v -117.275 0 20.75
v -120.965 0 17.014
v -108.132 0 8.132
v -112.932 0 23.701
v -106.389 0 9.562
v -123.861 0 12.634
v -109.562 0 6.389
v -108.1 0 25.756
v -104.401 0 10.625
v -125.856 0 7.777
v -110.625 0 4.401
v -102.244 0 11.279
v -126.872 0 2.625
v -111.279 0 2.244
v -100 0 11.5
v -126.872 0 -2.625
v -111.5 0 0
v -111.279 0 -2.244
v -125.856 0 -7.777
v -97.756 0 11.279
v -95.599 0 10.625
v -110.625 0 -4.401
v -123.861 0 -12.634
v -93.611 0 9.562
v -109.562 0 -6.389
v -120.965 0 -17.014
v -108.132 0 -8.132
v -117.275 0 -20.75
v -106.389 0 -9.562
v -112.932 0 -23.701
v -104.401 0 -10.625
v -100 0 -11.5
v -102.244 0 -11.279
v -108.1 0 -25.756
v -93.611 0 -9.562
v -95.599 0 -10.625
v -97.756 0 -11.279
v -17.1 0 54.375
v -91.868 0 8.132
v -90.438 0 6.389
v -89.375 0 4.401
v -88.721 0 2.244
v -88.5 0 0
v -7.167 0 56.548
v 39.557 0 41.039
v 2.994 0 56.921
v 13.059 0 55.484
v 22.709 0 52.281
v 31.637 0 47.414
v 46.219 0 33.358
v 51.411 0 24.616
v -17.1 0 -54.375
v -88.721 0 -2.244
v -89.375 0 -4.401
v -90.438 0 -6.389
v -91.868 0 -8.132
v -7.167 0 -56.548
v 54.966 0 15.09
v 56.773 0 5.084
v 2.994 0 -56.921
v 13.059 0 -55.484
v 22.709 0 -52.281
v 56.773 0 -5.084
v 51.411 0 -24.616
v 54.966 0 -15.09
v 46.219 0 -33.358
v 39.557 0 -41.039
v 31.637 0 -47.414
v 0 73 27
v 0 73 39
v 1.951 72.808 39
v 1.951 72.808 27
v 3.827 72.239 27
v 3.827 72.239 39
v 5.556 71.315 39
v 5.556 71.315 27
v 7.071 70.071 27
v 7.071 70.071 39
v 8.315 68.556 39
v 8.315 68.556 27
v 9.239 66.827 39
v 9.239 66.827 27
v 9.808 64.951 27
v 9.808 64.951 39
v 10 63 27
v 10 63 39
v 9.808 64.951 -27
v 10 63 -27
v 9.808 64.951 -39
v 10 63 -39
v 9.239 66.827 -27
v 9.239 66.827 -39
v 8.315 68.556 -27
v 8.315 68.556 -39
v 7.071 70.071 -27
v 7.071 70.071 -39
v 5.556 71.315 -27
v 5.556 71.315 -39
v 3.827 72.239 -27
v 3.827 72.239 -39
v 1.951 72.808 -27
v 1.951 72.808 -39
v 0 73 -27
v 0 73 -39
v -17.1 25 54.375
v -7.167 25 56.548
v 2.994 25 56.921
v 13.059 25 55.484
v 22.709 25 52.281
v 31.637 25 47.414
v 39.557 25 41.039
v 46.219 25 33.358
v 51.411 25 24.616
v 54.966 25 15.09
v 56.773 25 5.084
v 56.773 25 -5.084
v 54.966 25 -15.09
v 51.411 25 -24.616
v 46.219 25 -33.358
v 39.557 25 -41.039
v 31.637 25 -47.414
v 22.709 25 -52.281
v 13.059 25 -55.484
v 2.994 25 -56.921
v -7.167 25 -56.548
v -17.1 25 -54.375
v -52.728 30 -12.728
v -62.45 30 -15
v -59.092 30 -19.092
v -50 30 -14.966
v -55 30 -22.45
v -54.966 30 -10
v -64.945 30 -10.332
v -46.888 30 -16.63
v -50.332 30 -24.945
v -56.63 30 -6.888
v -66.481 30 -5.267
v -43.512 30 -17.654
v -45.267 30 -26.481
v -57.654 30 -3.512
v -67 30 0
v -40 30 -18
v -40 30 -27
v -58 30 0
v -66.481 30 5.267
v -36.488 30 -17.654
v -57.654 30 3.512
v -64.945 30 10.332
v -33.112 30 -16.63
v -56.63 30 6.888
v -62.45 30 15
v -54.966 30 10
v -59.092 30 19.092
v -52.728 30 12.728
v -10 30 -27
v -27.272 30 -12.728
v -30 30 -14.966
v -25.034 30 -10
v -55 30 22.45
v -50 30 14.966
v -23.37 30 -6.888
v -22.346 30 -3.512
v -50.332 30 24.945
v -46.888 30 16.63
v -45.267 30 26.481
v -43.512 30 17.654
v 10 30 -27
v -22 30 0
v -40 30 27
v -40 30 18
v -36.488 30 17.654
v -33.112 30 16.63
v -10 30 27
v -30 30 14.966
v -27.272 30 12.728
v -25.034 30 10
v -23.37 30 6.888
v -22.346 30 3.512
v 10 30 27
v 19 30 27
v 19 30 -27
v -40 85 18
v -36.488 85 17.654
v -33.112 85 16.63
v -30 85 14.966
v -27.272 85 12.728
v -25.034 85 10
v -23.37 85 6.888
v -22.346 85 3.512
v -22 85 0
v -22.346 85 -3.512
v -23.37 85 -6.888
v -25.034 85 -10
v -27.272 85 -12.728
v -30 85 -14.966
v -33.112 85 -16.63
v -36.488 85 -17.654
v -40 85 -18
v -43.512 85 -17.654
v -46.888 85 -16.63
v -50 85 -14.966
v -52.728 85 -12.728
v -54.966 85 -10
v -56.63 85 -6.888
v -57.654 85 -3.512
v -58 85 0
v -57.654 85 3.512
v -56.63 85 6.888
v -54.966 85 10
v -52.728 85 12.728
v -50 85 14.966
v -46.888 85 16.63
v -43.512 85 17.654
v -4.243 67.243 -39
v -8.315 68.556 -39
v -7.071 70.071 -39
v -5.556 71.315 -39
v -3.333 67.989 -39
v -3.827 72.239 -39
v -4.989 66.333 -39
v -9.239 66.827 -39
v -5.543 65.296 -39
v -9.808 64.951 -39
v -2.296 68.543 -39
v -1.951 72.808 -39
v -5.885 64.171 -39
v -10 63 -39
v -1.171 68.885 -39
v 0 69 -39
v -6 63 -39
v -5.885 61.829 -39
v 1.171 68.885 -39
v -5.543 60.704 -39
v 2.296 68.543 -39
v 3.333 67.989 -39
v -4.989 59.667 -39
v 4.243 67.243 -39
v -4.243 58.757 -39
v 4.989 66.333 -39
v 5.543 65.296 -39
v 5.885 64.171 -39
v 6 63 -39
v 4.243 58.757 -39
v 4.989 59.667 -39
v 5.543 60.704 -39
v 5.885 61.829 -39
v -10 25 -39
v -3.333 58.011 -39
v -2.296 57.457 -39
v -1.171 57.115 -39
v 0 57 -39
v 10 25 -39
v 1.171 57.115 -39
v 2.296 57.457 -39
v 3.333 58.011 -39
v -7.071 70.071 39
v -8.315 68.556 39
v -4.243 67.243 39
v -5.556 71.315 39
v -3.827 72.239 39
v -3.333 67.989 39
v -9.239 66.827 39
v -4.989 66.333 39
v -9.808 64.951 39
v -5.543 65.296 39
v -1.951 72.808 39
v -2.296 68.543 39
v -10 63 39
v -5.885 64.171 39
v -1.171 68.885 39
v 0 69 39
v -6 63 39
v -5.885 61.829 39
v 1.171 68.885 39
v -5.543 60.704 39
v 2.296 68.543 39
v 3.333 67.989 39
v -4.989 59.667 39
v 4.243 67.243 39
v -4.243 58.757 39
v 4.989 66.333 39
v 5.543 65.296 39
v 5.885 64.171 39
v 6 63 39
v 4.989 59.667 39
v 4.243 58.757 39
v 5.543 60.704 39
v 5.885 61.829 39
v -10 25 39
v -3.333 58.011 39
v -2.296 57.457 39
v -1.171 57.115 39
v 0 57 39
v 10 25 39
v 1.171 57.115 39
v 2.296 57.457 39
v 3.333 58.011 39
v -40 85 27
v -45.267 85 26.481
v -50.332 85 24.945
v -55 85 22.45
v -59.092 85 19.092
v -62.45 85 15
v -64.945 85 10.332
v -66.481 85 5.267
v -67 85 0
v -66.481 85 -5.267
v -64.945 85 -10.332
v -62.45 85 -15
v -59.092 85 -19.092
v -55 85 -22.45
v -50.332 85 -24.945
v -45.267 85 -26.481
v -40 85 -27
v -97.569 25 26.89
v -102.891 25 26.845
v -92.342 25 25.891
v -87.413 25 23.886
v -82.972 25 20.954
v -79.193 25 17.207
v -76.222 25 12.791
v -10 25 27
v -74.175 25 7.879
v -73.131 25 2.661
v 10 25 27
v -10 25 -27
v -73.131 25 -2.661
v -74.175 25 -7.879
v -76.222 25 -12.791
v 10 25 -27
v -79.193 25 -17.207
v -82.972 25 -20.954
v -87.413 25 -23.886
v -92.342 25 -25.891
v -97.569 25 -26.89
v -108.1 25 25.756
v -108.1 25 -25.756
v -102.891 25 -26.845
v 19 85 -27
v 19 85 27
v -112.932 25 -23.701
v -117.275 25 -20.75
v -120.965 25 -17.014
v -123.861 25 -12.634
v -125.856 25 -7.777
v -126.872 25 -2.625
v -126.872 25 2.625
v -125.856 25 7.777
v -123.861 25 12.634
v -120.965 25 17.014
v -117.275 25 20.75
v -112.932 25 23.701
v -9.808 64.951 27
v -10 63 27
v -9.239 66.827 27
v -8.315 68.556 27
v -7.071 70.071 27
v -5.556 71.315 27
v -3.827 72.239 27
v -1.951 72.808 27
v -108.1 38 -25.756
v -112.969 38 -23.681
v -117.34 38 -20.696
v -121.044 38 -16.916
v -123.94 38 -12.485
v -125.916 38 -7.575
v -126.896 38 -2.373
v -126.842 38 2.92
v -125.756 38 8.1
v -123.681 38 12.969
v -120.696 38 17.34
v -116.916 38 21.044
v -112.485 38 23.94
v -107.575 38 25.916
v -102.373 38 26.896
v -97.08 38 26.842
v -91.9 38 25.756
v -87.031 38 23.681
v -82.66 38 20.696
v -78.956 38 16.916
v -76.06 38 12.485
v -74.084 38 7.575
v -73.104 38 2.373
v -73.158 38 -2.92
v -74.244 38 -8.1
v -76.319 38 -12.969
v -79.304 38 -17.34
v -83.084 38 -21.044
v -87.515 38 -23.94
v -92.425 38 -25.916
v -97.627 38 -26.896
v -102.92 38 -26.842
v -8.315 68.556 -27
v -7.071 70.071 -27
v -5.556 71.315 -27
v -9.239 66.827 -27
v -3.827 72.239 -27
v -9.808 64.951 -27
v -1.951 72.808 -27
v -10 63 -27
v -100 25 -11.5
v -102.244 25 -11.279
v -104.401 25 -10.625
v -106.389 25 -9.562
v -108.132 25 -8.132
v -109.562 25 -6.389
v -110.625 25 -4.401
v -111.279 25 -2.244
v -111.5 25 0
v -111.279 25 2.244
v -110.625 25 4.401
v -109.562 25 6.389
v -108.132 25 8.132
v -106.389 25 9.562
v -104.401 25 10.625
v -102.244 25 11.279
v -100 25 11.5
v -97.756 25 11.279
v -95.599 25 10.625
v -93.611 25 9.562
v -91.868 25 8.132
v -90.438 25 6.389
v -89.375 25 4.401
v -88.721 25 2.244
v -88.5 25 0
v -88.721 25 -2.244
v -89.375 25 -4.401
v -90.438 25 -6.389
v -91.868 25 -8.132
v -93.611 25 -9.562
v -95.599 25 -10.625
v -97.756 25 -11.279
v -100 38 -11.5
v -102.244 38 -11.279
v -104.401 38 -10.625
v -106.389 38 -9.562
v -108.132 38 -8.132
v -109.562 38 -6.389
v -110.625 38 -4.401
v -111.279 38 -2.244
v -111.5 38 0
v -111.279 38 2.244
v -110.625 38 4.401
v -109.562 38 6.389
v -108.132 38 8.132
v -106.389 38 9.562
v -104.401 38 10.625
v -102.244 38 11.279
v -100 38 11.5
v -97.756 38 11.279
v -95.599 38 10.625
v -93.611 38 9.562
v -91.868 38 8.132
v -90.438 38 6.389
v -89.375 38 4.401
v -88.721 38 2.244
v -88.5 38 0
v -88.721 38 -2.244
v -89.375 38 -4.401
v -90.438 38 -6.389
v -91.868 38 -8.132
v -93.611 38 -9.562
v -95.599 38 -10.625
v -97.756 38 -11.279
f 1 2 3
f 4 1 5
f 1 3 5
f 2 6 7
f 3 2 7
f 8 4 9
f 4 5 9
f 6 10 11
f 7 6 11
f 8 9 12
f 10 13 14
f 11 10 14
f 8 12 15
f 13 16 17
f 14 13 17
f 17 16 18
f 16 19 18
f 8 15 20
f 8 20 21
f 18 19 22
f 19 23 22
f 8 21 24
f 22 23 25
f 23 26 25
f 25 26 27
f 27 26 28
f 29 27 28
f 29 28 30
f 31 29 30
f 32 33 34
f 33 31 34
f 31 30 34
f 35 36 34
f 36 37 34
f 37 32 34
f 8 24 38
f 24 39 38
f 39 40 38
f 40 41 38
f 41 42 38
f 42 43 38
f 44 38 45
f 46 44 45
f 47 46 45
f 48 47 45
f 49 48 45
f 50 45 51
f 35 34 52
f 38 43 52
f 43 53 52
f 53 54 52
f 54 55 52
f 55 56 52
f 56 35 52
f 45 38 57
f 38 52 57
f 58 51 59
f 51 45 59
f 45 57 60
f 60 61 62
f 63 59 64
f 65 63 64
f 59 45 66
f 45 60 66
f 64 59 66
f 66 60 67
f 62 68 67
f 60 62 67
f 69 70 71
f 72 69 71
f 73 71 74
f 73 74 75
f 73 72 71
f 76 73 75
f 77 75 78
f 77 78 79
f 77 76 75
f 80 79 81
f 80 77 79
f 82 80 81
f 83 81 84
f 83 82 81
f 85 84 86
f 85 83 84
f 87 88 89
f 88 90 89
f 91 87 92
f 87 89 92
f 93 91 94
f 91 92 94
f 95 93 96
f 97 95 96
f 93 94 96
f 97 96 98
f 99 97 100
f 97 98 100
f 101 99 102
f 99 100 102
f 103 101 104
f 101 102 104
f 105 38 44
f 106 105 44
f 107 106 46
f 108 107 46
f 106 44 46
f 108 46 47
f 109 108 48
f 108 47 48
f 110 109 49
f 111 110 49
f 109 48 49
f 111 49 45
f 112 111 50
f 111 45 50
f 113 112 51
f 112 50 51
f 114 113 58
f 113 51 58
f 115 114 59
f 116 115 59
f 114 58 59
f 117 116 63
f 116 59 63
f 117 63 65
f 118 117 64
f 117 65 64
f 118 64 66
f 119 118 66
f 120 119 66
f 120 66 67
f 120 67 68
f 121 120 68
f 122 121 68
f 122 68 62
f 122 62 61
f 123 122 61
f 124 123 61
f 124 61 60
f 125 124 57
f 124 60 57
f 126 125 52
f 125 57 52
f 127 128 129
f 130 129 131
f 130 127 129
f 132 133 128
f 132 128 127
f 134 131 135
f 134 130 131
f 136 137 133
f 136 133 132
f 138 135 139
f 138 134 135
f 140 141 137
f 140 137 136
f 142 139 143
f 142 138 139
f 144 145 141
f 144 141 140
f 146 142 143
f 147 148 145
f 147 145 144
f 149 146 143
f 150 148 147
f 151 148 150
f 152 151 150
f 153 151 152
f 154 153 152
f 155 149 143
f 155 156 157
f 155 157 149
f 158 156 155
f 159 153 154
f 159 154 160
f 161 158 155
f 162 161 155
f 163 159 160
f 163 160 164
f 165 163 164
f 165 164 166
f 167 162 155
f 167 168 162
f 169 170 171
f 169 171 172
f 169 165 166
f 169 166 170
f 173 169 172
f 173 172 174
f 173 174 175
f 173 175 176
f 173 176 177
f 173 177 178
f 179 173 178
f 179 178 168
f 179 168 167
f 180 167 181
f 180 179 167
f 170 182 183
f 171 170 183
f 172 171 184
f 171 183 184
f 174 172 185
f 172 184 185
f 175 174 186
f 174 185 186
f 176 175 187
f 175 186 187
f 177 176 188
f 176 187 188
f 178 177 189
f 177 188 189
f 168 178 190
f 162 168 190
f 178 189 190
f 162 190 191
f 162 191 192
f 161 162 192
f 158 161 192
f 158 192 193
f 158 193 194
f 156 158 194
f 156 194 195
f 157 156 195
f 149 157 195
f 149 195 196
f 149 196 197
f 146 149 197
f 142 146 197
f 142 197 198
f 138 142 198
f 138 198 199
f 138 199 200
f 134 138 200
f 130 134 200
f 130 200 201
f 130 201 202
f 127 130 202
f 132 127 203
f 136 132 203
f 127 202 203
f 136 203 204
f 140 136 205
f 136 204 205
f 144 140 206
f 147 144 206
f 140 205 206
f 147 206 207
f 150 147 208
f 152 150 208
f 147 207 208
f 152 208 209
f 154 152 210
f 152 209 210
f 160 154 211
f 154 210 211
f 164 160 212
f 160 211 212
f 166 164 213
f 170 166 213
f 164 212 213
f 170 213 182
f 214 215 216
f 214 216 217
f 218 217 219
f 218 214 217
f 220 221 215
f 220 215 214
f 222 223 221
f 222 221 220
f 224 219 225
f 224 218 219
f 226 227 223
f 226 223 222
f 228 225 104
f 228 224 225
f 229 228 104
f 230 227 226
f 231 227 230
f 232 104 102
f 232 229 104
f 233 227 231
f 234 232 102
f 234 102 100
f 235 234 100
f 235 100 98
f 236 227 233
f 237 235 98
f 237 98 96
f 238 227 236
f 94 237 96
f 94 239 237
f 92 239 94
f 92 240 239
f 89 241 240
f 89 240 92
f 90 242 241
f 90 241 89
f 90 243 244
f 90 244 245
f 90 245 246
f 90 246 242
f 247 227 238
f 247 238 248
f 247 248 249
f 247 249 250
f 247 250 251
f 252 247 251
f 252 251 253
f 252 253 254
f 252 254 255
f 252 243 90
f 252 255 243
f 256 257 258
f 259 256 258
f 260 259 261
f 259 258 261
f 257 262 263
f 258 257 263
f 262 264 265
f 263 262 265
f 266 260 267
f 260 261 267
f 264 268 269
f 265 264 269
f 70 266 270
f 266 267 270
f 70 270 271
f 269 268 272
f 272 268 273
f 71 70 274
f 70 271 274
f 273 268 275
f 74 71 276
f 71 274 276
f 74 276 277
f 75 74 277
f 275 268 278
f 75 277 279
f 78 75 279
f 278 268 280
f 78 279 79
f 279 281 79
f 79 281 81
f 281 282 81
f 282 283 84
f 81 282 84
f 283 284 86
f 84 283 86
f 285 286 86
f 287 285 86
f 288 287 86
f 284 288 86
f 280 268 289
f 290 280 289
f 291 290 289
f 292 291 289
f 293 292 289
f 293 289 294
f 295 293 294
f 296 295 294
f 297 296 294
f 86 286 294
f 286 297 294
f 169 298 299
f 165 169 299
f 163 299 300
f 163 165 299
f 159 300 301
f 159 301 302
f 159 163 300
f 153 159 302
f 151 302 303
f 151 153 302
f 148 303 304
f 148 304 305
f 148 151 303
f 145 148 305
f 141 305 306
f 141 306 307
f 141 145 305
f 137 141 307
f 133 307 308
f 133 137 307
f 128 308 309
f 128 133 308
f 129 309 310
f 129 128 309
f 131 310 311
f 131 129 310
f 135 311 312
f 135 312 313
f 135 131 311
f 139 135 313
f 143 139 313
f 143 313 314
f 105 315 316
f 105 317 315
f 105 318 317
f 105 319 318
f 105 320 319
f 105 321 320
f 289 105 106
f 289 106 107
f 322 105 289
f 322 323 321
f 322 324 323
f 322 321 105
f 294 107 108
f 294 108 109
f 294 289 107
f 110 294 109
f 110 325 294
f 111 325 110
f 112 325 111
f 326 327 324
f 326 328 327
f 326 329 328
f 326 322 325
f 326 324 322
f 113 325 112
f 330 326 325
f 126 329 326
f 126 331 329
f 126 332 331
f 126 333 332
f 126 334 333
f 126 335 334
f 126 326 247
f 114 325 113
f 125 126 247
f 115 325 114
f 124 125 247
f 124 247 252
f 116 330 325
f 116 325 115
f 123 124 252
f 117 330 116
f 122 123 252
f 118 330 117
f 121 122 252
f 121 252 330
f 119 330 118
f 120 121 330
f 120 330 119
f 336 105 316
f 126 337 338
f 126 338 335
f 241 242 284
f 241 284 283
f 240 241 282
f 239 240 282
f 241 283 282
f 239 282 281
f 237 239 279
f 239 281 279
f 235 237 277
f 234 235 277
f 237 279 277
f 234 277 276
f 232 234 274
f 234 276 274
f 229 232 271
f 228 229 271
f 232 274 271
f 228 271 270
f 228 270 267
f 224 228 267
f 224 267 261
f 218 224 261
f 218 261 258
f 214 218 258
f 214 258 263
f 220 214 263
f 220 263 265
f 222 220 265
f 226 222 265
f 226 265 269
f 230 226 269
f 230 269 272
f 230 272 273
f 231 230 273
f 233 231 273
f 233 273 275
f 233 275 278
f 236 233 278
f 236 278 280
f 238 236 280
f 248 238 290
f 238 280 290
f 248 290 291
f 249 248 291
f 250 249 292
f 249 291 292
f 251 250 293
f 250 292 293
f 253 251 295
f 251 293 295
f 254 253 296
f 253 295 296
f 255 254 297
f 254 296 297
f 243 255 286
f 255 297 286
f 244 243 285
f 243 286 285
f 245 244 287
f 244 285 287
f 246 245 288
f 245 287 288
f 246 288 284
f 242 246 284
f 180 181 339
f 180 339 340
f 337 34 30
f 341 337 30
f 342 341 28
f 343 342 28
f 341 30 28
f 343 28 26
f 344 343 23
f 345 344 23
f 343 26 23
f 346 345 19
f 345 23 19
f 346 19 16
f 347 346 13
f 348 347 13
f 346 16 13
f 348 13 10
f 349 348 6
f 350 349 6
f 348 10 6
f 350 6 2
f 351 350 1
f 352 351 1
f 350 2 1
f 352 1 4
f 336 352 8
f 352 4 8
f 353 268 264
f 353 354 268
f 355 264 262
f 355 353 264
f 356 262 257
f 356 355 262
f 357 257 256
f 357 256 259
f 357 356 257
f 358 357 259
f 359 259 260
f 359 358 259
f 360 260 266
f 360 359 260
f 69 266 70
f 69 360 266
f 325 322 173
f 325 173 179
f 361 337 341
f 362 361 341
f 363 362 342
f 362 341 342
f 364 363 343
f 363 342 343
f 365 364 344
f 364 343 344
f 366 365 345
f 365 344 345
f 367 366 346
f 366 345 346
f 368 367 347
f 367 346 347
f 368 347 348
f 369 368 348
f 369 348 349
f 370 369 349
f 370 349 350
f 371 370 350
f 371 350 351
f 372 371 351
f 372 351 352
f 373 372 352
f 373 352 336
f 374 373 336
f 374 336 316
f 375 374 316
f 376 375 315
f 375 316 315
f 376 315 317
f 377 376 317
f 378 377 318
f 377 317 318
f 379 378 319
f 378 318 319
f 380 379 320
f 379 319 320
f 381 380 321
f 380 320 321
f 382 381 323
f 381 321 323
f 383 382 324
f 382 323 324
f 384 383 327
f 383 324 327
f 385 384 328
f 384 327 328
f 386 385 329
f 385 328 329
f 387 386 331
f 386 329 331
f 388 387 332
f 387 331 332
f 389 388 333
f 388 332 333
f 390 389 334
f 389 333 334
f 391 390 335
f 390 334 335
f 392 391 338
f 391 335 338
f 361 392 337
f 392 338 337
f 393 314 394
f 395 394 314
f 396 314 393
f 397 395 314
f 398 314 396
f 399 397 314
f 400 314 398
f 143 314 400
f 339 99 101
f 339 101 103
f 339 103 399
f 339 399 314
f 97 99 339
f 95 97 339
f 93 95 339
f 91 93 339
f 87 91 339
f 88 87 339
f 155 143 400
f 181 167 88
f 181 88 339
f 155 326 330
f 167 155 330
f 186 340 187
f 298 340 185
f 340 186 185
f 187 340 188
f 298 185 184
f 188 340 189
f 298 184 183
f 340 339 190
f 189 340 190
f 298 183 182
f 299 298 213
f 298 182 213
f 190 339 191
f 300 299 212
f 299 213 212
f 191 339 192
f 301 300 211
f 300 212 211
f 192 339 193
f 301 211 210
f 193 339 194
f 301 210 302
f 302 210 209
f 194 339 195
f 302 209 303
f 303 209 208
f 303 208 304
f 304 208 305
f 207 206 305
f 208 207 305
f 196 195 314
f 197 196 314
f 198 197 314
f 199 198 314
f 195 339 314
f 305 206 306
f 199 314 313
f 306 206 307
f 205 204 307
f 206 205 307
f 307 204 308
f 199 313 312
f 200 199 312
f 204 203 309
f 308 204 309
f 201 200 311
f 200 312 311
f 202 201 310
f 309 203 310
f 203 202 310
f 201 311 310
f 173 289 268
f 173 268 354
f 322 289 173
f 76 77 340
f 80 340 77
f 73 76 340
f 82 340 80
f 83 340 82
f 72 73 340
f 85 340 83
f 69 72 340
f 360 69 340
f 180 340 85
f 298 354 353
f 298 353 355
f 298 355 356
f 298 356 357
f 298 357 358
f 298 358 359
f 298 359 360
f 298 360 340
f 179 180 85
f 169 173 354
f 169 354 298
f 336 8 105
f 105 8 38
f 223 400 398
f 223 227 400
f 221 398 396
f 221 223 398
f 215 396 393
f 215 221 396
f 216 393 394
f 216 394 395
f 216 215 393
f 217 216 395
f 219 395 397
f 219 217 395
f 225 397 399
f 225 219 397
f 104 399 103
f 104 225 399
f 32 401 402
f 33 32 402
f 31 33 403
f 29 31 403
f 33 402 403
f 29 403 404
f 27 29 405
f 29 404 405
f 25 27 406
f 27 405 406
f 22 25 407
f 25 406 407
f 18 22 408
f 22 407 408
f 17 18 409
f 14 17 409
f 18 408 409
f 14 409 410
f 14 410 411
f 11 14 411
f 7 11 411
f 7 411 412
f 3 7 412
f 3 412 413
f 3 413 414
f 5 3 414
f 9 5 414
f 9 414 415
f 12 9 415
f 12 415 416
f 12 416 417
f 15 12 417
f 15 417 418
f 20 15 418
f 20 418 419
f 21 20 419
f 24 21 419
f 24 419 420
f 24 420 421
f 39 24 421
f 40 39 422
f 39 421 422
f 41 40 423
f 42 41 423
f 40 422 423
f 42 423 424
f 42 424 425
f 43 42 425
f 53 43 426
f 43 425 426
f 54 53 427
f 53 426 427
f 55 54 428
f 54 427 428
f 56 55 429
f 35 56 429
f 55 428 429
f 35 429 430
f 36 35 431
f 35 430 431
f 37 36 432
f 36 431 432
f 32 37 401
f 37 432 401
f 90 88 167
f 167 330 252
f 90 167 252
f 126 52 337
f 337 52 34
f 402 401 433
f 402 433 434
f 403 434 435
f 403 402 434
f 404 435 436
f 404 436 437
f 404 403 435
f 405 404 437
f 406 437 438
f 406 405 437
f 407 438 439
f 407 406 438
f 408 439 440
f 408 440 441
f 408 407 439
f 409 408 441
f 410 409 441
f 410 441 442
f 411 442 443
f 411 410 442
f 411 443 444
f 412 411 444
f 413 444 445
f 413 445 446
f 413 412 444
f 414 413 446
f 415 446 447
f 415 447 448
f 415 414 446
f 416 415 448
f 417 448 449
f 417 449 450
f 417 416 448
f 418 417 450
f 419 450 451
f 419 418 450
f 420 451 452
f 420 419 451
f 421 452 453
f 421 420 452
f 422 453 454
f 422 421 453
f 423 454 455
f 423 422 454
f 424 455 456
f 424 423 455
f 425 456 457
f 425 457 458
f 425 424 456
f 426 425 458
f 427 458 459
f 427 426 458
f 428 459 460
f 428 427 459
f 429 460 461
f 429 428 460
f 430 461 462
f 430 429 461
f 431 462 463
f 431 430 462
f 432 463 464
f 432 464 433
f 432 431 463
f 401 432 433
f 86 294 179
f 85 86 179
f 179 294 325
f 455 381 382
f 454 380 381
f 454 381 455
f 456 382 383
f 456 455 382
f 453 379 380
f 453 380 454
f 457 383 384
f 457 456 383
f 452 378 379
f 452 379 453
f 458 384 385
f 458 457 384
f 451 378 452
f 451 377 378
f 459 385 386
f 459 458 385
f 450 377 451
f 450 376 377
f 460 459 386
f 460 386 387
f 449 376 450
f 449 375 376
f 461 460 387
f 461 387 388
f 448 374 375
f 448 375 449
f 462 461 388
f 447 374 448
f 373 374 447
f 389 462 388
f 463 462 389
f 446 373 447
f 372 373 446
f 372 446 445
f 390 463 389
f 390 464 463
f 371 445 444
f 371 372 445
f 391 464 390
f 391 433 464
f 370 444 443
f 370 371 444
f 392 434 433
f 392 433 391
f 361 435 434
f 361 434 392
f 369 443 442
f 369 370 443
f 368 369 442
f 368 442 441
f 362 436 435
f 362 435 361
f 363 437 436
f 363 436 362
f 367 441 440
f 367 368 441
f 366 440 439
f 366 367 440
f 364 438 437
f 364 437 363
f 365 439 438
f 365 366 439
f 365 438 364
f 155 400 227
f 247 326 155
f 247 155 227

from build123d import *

# Parameters (mm, degrees)
BASE_DEPTH                 = 25
SKETCH2_R                  = 27
SKETCH2_R_2                = 11.5
FRONT_THRU_BORDER_DEPTH    = 13
SKETCH4_R                  = 11.5
FRONT_THRU_HOLE_DEPTH      = 142.431962441
TOP_FEATURE_DEPTH          = 60
SKETCH6_R                  = 18
TOP_FEATURE_HOLE_DEPTH     = 60
SKETCH7_W                  = 90
SKETCH7_H                  = 5
TOP_FEATURE_GAP_DEPTH      = 175.38463235
SKETCH8_W                  = 20
SKETCH8_H                  = 12
TOP_FEATURE_ARM_DEPTH      = 48
FILLET2_R                  = 10
SKETCH10_R                 = 6
TOP_FEATURE_ARM_HOLE_DEPTH = 181.471604415


with BuildPart() as part:
    # Sketch1 → base (new body)
    with BuildSketch(Plane(origin=(0, 0, 0), x_dir=(1, 0, 0), z_dir=(0, 1, 0))):
        with BuildLine():
            Line((-108.1, -25.756358438), (-17.1, -54.374534481))
            ThreePointArc((-17.1, -54.374534481), (57, 0), (-17.1, 54.374534481))
            Line((-17.1, 54.374534481), (-108.1, 25.756358438))
            ThreePointArc((-108.1, 25.756358438), (-127, 0), (-108.1, -25.756358438))
        make_face()
    extrude(amount=BASE_DEPTH)

    # Sketch2 → front thru border (add)
    with BuildSketch(Plane(origin=(0, 25, 0), x_dir=(1, 0, 0), z_dir=(0, 1, 0))):
        with Locations(Location((-100, 0, 0), (0, 0, 107.457603124))):
            Circle(SKETCH2_R)
        with Locations(Location((-100, 0, 0), (0, 0, 90))):
            Circle(SKETCH2_R_2, mode=Mode.SUBTRACT)
    extrude(amount=FRONT_THRU_BORDER_DEPTH)

    # Sketch4 → front thru hole (cut, through all)
    with BuildSketch(Plane(origin=(0, 25, 0), x_dir=(1, 0, 0), z_dir=(0, 1, 0))):
        with Locations(Location((-100, 0, 0), (0, 0, 90))):
            Circle(SKETCH4_R)
    extrude(amount=-FRONT_THRU_HOLE_DEPTH, mode=Mode.SUBTRACT)

    # Sketch5 → top feature (add)
    with BuildSketch(Plane(origin=(0, 25, 0), x_dir=(1, 0, 0), z_dir=(0, 1, 0))):
        with BuildLine():
            Line((0, -27), (-40, -27))
            ThreePointArc((-40, -27), (-67, 0), (-40, 27))
            Line((-40, 27), (0, 27))
            Line((0, 27), (19, 27))
            Line((19, 27), (19, -27))
            Line((19, -27), (0, -27))
        make_face()
    extrude(amount=TOP_FEATURE_DEPTH)

    # Sketch6 → top feature hole (cut)
    with BuildSketch(Plane(origin=(0, 85, 0), x_dir=(1, 0, 0), z_dir=(0, 1, 0))):
        with Locations(Location((-40, 0, 0), (0, 0, 270))):
            Circle(SKETCH6_R)
    extrude(amount=-TOP_FEATURE_HOLE_DEPTH, mode=Mode.SUBTRACT)

    # Sketch7 → top feature gap (cut, through all)
    with BuildSketch(Plane.XY.offset(27)):
        with Locations((-26, 27.5)):
            Rectangle(SKETCH7_W, SKETCH7_H)
    extrude(amount=-TOP_FEATURE_GAP_DEPTH, mode=Mode.SUBTRACT)


with BuildPart() as top_feature_gap_piece_1:
    # of the separate pieces the step leaves, piece 1, a body of its own (top_feature_gap_pieces)
    add(part.part.solids().sort_by_distance((-17.1, 0, -54.374534481))[0])



with BuildPart() as top_feature_gap_piece_2:
    # of the separate pieces the step leaves, piece 2, a body of its own (top_feature_gap_pieces)
    add(part.part.solids().sort_by_distance((19, 30, -27))[0])


with BuildPart() as top_feature_gap_piece_1_1:
    add(top_feature_gap_piece_1.part)

    add(top_feature_gap_piece_2.part)  # top feature arm merges top feature gap piece 2
    # Sketch8 → top feature arm (add)
    with BuildSketch(Plane(origin=(0, 25, 0), x_dir=(1, 0, 0), z_dir=(0, 1, 0))):
        with Locations((0, -33)):
            Rectangle(SKETCH8_W, SKETCH8_H)
        with Locations((0, 33)):
            Rectangle(SKETCH8_W, SKETCH8_H)
    extrude(amount=TOP_FEATURE_ARM_DEPTH)

    # Fillet2
    fillet2_edges = [top_feature_gap_piece_1_1.edges().sort_by_distance(p)[0] for p in [
        (10, 73, -33),
        (-10, 73, -33),
        (10, 73, 33),
        (-10, 73, 33),
    ]]
    fillet(fillet2_edges, radius=FILLET2_R - 0.0001)  # a hair under: the kernel refuses the full size

    # Sketch10 → top feature arm hole (cut, through all)
    with BuildSketch(Plane.XY.offset(39)):
        with Locations((0, 63)):
            Circle(SKETCH10_R)
    extrude(amount=-TOP_FEATURE_ARM_HOLE_DEPTH, mode=Mode.SUBTRACT)


solid = top_feature_gap_piece_1_1.part
